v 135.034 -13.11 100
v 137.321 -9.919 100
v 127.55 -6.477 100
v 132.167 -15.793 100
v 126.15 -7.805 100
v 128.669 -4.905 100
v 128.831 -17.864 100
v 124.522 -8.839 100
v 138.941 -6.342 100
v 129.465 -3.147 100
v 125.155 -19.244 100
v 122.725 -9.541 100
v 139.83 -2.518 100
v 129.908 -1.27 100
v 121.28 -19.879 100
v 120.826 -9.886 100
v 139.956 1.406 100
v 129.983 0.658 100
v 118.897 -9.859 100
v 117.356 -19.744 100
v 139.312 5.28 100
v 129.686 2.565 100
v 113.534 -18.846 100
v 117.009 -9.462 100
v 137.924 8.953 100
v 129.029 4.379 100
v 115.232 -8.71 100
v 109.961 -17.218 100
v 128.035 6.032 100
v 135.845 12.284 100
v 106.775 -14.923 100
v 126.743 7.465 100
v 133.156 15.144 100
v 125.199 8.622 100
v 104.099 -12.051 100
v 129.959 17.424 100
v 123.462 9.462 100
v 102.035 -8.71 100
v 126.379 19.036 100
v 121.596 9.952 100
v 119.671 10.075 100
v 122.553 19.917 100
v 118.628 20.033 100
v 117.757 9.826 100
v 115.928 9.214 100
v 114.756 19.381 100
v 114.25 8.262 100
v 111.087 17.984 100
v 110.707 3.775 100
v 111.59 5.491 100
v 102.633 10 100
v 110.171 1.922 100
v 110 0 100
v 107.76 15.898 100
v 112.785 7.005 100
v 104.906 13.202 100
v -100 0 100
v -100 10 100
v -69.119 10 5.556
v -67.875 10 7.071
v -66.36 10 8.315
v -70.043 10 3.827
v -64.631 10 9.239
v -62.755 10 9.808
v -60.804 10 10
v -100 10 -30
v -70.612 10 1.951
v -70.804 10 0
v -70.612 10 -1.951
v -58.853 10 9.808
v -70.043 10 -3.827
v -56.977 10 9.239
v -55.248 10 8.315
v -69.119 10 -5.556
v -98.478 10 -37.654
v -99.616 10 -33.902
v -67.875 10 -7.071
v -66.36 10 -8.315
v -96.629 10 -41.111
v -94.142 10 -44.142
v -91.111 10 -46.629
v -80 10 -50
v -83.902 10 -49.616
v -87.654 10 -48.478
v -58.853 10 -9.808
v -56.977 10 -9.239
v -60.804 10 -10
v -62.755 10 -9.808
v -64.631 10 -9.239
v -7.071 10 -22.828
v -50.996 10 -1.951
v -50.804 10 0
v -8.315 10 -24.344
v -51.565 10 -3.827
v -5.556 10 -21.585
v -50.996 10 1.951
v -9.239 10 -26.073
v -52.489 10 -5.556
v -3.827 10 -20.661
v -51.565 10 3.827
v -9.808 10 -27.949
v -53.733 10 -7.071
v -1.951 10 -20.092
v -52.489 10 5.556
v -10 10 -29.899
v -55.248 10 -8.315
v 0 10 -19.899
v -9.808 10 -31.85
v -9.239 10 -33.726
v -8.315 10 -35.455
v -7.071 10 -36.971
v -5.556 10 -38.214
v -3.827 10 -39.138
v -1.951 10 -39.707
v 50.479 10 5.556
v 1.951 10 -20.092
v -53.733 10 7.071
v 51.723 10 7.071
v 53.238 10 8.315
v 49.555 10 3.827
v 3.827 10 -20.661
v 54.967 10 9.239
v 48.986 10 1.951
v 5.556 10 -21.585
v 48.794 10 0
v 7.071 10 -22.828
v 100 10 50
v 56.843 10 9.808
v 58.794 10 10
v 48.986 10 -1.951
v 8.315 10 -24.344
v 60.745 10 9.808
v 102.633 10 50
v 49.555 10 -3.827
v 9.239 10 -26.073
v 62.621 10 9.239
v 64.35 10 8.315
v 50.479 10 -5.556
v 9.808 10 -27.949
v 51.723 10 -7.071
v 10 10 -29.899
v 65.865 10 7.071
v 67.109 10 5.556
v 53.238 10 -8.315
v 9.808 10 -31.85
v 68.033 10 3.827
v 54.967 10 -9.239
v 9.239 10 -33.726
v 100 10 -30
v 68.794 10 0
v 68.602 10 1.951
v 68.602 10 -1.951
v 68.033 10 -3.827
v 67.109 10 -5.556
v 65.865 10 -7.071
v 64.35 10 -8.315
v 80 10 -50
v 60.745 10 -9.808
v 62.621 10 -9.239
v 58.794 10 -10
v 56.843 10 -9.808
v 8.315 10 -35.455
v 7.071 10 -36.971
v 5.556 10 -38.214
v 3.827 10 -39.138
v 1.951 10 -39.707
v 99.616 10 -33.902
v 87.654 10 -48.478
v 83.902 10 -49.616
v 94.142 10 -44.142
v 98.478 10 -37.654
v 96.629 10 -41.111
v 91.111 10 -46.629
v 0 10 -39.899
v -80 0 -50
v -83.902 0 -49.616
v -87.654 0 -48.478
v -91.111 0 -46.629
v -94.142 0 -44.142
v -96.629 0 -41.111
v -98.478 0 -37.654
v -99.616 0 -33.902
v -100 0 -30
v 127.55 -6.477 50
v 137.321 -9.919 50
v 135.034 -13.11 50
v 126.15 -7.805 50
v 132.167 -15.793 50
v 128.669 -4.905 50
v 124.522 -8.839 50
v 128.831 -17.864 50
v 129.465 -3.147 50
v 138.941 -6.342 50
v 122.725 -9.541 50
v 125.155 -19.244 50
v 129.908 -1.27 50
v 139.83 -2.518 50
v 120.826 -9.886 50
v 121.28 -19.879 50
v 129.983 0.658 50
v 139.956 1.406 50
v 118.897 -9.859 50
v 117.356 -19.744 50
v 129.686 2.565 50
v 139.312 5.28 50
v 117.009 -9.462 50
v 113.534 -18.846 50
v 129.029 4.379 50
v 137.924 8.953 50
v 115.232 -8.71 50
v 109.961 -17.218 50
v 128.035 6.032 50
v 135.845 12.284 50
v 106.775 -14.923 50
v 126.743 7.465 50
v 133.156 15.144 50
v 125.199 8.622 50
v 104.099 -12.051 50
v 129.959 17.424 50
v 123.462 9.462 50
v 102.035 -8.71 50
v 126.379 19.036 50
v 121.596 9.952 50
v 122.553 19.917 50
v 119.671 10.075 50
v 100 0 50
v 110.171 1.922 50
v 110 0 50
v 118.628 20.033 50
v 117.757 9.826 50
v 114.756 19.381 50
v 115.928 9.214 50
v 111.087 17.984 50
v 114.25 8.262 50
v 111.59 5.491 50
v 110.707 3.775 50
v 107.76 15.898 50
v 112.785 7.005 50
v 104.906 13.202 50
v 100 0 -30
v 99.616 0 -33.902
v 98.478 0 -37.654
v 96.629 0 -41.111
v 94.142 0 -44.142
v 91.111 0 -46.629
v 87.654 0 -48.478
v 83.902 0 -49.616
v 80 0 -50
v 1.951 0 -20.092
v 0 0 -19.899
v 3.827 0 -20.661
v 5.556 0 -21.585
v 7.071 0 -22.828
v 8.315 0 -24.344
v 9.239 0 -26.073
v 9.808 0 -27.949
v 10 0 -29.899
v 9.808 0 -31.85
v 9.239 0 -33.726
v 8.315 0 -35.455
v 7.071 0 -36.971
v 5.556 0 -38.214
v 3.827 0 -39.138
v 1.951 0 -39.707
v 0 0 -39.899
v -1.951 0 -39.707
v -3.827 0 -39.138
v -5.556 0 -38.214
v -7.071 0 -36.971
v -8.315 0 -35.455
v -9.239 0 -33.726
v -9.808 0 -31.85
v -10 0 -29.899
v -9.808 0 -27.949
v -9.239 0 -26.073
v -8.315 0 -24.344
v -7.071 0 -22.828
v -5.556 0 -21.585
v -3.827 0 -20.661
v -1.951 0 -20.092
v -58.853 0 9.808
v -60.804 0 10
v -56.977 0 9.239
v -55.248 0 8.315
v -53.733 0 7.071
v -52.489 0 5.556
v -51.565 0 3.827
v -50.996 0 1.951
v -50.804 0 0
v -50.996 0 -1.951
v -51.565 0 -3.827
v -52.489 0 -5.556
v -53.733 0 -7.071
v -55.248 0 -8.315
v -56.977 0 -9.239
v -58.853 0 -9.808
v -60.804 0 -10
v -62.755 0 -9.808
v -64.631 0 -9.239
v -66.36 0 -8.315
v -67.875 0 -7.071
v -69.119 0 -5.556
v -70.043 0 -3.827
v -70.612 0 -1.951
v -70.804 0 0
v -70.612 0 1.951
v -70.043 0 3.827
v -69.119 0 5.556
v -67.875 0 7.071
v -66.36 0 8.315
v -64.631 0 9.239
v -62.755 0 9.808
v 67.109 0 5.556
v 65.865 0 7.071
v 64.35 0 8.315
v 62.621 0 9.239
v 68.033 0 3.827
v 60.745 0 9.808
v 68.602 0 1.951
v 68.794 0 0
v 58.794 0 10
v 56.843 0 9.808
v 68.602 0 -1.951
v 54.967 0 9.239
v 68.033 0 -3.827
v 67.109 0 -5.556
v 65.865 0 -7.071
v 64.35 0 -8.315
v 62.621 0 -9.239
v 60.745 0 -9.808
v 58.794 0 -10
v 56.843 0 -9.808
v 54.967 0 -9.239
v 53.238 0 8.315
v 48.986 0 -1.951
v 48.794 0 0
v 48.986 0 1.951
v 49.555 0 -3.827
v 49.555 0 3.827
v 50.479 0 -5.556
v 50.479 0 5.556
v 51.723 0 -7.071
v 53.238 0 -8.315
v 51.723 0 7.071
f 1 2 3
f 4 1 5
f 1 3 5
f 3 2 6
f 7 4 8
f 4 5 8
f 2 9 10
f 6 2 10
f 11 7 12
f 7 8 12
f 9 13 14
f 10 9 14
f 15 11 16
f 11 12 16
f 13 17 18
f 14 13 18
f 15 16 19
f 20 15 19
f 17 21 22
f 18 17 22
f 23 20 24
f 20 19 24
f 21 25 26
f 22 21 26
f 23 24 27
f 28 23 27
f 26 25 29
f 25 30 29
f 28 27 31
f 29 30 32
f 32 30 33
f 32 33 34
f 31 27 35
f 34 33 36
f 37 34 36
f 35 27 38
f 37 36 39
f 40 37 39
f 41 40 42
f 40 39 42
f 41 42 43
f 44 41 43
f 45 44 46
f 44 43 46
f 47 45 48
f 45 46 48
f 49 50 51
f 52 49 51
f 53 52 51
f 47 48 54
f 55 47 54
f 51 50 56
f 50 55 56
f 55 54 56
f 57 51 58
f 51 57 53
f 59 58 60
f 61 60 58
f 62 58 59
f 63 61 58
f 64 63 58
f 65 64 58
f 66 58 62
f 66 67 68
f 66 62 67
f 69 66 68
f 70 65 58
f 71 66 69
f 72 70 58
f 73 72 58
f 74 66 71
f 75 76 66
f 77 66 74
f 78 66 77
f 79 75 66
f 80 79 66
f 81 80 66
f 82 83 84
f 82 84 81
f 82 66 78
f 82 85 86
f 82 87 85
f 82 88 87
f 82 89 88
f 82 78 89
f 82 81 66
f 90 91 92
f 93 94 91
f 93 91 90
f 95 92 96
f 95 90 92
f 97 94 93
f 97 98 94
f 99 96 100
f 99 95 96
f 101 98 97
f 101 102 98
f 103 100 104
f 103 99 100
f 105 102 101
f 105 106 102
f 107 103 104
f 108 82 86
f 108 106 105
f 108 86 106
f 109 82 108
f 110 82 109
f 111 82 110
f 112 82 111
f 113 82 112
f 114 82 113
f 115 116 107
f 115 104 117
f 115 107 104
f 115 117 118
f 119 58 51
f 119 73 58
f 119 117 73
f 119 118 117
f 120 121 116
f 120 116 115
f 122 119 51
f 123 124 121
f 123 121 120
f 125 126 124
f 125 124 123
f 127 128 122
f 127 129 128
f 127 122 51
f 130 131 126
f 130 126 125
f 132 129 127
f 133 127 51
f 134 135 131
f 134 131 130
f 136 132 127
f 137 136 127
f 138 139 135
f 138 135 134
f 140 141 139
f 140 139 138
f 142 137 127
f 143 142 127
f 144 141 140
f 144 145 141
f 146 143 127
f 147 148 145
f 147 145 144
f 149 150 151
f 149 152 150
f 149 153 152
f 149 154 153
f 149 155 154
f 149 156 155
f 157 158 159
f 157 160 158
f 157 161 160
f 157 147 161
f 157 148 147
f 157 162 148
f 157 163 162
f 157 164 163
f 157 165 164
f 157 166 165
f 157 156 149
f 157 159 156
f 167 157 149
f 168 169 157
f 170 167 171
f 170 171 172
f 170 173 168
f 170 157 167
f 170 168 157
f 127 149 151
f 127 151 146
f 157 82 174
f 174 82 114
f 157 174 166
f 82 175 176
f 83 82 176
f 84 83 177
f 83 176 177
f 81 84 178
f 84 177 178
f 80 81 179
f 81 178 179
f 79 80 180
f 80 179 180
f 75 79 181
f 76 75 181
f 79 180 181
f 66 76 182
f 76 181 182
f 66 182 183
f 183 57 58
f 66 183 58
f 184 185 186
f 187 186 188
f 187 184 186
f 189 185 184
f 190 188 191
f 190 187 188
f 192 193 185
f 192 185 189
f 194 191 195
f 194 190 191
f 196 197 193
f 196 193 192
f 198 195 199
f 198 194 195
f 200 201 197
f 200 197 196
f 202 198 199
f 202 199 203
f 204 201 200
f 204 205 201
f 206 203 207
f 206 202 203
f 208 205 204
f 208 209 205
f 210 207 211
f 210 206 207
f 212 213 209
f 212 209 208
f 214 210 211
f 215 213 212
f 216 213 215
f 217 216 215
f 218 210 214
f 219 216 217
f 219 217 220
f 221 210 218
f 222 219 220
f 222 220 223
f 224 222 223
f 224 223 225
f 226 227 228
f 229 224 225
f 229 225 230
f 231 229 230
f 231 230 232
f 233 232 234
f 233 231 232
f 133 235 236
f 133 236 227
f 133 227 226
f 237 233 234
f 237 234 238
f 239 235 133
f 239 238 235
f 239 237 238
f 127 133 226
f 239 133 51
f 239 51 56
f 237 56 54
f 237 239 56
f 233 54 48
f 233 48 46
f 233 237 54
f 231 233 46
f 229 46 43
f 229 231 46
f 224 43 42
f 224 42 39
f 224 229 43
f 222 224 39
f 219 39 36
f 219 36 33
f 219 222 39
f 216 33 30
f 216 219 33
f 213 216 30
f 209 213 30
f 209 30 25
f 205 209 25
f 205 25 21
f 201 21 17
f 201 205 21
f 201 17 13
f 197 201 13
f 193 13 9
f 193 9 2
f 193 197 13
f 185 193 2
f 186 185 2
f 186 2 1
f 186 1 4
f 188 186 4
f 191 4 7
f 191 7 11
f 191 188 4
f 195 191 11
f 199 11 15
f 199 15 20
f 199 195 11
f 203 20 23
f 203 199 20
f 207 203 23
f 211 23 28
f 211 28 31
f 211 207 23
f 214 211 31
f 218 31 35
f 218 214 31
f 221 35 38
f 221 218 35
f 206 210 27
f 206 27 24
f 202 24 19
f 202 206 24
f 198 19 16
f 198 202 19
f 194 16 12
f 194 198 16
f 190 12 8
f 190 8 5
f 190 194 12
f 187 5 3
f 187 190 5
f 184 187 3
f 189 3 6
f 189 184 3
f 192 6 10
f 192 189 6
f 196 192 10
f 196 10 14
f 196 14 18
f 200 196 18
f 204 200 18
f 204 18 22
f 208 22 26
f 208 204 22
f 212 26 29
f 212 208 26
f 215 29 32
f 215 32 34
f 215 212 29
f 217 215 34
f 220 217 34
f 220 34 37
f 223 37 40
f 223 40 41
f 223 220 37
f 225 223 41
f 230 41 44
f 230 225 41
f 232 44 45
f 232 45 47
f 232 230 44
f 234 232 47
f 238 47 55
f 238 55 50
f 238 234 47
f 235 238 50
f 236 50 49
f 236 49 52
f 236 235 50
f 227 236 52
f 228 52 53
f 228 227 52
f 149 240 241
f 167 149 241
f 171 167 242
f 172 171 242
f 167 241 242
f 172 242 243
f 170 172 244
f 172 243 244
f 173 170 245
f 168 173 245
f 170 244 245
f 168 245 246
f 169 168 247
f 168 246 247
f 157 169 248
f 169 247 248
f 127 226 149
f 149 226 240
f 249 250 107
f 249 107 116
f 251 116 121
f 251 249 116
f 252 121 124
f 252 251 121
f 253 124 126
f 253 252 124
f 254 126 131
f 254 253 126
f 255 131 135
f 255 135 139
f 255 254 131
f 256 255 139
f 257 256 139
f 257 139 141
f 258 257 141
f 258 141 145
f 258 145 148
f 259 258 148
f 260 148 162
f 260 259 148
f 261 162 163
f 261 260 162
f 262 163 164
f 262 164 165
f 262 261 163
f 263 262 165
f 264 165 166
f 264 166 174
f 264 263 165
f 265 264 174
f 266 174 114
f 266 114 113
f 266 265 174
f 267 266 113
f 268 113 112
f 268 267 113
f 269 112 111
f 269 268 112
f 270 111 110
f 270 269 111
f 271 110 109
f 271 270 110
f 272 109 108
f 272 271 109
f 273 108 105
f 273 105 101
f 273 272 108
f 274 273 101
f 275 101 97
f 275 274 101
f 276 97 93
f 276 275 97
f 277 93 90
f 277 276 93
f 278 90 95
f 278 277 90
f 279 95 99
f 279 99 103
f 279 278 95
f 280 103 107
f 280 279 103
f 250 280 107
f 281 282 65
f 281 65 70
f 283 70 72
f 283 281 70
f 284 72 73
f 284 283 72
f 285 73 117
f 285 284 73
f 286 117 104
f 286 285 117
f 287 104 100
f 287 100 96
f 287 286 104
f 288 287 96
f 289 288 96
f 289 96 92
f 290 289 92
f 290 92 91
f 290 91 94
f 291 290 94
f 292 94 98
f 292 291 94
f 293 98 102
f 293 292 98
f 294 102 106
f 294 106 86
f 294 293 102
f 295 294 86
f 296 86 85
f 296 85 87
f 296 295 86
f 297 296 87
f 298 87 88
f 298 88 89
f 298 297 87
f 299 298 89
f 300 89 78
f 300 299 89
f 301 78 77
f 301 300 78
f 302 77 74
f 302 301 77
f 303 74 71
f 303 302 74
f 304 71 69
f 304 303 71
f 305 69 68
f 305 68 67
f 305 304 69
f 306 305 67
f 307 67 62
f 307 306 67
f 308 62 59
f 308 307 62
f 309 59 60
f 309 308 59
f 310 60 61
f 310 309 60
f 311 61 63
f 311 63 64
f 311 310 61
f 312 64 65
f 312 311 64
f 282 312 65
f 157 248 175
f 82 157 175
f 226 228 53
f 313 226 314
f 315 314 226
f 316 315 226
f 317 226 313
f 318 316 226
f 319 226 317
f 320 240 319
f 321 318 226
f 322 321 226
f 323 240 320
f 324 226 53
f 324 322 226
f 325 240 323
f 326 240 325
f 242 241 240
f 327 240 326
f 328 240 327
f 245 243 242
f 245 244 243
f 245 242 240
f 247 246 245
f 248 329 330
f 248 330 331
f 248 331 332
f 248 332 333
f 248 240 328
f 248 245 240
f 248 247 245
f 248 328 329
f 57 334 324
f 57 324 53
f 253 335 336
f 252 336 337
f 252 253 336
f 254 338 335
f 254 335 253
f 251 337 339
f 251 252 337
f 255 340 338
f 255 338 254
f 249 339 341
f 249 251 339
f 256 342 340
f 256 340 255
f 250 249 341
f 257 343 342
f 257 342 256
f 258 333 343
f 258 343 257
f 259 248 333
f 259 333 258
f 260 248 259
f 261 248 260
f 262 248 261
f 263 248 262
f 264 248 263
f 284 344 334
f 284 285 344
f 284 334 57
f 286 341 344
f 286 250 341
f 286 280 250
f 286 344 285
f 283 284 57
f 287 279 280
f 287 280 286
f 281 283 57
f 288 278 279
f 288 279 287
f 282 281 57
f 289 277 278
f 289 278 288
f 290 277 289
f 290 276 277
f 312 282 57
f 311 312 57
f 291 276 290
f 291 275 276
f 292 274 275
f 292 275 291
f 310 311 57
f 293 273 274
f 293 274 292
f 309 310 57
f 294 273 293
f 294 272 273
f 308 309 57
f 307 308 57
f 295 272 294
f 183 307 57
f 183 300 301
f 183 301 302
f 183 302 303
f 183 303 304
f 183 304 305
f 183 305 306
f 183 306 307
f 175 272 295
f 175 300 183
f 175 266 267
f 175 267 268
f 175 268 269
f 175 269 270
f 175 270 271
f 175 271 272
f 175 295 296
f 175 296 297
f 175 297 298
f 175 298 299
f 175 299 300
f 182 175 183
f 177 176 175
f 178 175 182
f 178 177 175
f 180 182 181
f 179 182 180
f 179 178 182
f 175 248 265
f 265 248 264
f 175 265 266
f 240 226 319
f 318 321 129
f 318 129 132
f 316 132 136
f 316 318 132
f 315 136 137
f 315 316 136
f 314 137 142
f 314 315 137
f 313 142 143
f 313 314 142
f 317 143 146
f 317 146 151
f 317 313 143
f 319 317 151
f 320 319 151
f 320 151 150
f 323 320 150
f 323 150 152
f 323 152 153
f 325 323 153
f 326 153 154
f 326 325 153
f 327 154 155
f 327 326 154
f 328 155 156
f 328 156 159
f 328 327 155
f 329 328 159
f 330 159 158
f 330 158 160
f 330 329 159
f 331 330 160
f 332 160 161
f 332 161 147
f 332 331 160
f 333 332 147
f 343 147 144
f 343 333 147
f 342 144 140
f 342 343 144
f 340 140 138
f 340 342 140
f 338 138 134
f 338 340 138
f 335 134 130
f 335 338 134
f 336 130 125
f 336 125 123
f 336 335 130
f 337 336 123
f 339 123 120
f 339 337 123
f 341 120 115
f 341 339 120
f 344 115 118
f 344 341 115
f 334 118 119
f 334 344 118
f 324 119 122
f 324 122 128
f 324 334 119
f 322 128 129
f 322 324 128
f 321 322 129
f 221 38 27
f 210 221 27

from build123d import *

# Parameters (mm, degrees)
SKETCH2_R           = 10
BOSS_EXTRUDE2_DEPTH = 10
BOSS_EXTRUDE4_DEPTH = 50


with BuildPart() as part:
    # Sketch2 → Boss-Extrude2 (new body)
    with BuildSketch(Plane(origin=(0, 0, 0), x_dir=(1, 0, 0), z_dir=(0, 1, 0))):
        with BuildLine():
            Line((-100, -50), (100, -50))
            Line((100, -50), (100, 30))
            ThreePointArc((100, 30), (94.142135624, 44.142135624), (80, 50))
            Line((80, 50), (-80, 50))
            ThreePointArc((-80, 50), (-94.142135624, 44.142135624), (-100, 30))
            Line((-100, 30), (-100, -50))
        make_face()
        with Locations(Location((58.793969849, 0, 0), (0, 0, 270))):
            Circle(SKETCH2_R, mode=Mode.SUBTRACT)
        with Locations(Location((-60.804020101, 0, 0), (0, 0, 270))):
            Circle(SKETCH2_R, mode=Mode.SUBTRACT)
        with Locations(Location((0, 29.899497487, 0), (0, 0, 270))):
            Circle(SKETCH2_R, mode=Mode.SUBTRACT)
    extrude(amount=BOSS_EXTRUDE2_DEPTH)

    # Sketch3 → Boss-Extrude4 (add)
    with BuildSketch(Plane.XY.offset(50)):
        with BuildLine():
            Line((100, 10), (102.633258285, 10))
            ThreePointArc((102.633258285, 10), (139.989628378, -0.558774103), (102.0351621, -8.710129001))
            Line((102.0351621, -8.710129001), (115.232280048, -8.710129001))
            ThreePointArc((115.232280048, -8.710129001), (128.572143936, 5.229557302), (110.000160919, 0))
            Line((110.000160919, 0), (100, 0))
            Line((100, 0), (-100, 0))
            Line((-100, 0), (-100, 10))
            Line((-100, 10), (100, 10))
        make_face()
    extrude(amount=BOSS_EXTRUDE4_DEPTH)


solid = part.part
